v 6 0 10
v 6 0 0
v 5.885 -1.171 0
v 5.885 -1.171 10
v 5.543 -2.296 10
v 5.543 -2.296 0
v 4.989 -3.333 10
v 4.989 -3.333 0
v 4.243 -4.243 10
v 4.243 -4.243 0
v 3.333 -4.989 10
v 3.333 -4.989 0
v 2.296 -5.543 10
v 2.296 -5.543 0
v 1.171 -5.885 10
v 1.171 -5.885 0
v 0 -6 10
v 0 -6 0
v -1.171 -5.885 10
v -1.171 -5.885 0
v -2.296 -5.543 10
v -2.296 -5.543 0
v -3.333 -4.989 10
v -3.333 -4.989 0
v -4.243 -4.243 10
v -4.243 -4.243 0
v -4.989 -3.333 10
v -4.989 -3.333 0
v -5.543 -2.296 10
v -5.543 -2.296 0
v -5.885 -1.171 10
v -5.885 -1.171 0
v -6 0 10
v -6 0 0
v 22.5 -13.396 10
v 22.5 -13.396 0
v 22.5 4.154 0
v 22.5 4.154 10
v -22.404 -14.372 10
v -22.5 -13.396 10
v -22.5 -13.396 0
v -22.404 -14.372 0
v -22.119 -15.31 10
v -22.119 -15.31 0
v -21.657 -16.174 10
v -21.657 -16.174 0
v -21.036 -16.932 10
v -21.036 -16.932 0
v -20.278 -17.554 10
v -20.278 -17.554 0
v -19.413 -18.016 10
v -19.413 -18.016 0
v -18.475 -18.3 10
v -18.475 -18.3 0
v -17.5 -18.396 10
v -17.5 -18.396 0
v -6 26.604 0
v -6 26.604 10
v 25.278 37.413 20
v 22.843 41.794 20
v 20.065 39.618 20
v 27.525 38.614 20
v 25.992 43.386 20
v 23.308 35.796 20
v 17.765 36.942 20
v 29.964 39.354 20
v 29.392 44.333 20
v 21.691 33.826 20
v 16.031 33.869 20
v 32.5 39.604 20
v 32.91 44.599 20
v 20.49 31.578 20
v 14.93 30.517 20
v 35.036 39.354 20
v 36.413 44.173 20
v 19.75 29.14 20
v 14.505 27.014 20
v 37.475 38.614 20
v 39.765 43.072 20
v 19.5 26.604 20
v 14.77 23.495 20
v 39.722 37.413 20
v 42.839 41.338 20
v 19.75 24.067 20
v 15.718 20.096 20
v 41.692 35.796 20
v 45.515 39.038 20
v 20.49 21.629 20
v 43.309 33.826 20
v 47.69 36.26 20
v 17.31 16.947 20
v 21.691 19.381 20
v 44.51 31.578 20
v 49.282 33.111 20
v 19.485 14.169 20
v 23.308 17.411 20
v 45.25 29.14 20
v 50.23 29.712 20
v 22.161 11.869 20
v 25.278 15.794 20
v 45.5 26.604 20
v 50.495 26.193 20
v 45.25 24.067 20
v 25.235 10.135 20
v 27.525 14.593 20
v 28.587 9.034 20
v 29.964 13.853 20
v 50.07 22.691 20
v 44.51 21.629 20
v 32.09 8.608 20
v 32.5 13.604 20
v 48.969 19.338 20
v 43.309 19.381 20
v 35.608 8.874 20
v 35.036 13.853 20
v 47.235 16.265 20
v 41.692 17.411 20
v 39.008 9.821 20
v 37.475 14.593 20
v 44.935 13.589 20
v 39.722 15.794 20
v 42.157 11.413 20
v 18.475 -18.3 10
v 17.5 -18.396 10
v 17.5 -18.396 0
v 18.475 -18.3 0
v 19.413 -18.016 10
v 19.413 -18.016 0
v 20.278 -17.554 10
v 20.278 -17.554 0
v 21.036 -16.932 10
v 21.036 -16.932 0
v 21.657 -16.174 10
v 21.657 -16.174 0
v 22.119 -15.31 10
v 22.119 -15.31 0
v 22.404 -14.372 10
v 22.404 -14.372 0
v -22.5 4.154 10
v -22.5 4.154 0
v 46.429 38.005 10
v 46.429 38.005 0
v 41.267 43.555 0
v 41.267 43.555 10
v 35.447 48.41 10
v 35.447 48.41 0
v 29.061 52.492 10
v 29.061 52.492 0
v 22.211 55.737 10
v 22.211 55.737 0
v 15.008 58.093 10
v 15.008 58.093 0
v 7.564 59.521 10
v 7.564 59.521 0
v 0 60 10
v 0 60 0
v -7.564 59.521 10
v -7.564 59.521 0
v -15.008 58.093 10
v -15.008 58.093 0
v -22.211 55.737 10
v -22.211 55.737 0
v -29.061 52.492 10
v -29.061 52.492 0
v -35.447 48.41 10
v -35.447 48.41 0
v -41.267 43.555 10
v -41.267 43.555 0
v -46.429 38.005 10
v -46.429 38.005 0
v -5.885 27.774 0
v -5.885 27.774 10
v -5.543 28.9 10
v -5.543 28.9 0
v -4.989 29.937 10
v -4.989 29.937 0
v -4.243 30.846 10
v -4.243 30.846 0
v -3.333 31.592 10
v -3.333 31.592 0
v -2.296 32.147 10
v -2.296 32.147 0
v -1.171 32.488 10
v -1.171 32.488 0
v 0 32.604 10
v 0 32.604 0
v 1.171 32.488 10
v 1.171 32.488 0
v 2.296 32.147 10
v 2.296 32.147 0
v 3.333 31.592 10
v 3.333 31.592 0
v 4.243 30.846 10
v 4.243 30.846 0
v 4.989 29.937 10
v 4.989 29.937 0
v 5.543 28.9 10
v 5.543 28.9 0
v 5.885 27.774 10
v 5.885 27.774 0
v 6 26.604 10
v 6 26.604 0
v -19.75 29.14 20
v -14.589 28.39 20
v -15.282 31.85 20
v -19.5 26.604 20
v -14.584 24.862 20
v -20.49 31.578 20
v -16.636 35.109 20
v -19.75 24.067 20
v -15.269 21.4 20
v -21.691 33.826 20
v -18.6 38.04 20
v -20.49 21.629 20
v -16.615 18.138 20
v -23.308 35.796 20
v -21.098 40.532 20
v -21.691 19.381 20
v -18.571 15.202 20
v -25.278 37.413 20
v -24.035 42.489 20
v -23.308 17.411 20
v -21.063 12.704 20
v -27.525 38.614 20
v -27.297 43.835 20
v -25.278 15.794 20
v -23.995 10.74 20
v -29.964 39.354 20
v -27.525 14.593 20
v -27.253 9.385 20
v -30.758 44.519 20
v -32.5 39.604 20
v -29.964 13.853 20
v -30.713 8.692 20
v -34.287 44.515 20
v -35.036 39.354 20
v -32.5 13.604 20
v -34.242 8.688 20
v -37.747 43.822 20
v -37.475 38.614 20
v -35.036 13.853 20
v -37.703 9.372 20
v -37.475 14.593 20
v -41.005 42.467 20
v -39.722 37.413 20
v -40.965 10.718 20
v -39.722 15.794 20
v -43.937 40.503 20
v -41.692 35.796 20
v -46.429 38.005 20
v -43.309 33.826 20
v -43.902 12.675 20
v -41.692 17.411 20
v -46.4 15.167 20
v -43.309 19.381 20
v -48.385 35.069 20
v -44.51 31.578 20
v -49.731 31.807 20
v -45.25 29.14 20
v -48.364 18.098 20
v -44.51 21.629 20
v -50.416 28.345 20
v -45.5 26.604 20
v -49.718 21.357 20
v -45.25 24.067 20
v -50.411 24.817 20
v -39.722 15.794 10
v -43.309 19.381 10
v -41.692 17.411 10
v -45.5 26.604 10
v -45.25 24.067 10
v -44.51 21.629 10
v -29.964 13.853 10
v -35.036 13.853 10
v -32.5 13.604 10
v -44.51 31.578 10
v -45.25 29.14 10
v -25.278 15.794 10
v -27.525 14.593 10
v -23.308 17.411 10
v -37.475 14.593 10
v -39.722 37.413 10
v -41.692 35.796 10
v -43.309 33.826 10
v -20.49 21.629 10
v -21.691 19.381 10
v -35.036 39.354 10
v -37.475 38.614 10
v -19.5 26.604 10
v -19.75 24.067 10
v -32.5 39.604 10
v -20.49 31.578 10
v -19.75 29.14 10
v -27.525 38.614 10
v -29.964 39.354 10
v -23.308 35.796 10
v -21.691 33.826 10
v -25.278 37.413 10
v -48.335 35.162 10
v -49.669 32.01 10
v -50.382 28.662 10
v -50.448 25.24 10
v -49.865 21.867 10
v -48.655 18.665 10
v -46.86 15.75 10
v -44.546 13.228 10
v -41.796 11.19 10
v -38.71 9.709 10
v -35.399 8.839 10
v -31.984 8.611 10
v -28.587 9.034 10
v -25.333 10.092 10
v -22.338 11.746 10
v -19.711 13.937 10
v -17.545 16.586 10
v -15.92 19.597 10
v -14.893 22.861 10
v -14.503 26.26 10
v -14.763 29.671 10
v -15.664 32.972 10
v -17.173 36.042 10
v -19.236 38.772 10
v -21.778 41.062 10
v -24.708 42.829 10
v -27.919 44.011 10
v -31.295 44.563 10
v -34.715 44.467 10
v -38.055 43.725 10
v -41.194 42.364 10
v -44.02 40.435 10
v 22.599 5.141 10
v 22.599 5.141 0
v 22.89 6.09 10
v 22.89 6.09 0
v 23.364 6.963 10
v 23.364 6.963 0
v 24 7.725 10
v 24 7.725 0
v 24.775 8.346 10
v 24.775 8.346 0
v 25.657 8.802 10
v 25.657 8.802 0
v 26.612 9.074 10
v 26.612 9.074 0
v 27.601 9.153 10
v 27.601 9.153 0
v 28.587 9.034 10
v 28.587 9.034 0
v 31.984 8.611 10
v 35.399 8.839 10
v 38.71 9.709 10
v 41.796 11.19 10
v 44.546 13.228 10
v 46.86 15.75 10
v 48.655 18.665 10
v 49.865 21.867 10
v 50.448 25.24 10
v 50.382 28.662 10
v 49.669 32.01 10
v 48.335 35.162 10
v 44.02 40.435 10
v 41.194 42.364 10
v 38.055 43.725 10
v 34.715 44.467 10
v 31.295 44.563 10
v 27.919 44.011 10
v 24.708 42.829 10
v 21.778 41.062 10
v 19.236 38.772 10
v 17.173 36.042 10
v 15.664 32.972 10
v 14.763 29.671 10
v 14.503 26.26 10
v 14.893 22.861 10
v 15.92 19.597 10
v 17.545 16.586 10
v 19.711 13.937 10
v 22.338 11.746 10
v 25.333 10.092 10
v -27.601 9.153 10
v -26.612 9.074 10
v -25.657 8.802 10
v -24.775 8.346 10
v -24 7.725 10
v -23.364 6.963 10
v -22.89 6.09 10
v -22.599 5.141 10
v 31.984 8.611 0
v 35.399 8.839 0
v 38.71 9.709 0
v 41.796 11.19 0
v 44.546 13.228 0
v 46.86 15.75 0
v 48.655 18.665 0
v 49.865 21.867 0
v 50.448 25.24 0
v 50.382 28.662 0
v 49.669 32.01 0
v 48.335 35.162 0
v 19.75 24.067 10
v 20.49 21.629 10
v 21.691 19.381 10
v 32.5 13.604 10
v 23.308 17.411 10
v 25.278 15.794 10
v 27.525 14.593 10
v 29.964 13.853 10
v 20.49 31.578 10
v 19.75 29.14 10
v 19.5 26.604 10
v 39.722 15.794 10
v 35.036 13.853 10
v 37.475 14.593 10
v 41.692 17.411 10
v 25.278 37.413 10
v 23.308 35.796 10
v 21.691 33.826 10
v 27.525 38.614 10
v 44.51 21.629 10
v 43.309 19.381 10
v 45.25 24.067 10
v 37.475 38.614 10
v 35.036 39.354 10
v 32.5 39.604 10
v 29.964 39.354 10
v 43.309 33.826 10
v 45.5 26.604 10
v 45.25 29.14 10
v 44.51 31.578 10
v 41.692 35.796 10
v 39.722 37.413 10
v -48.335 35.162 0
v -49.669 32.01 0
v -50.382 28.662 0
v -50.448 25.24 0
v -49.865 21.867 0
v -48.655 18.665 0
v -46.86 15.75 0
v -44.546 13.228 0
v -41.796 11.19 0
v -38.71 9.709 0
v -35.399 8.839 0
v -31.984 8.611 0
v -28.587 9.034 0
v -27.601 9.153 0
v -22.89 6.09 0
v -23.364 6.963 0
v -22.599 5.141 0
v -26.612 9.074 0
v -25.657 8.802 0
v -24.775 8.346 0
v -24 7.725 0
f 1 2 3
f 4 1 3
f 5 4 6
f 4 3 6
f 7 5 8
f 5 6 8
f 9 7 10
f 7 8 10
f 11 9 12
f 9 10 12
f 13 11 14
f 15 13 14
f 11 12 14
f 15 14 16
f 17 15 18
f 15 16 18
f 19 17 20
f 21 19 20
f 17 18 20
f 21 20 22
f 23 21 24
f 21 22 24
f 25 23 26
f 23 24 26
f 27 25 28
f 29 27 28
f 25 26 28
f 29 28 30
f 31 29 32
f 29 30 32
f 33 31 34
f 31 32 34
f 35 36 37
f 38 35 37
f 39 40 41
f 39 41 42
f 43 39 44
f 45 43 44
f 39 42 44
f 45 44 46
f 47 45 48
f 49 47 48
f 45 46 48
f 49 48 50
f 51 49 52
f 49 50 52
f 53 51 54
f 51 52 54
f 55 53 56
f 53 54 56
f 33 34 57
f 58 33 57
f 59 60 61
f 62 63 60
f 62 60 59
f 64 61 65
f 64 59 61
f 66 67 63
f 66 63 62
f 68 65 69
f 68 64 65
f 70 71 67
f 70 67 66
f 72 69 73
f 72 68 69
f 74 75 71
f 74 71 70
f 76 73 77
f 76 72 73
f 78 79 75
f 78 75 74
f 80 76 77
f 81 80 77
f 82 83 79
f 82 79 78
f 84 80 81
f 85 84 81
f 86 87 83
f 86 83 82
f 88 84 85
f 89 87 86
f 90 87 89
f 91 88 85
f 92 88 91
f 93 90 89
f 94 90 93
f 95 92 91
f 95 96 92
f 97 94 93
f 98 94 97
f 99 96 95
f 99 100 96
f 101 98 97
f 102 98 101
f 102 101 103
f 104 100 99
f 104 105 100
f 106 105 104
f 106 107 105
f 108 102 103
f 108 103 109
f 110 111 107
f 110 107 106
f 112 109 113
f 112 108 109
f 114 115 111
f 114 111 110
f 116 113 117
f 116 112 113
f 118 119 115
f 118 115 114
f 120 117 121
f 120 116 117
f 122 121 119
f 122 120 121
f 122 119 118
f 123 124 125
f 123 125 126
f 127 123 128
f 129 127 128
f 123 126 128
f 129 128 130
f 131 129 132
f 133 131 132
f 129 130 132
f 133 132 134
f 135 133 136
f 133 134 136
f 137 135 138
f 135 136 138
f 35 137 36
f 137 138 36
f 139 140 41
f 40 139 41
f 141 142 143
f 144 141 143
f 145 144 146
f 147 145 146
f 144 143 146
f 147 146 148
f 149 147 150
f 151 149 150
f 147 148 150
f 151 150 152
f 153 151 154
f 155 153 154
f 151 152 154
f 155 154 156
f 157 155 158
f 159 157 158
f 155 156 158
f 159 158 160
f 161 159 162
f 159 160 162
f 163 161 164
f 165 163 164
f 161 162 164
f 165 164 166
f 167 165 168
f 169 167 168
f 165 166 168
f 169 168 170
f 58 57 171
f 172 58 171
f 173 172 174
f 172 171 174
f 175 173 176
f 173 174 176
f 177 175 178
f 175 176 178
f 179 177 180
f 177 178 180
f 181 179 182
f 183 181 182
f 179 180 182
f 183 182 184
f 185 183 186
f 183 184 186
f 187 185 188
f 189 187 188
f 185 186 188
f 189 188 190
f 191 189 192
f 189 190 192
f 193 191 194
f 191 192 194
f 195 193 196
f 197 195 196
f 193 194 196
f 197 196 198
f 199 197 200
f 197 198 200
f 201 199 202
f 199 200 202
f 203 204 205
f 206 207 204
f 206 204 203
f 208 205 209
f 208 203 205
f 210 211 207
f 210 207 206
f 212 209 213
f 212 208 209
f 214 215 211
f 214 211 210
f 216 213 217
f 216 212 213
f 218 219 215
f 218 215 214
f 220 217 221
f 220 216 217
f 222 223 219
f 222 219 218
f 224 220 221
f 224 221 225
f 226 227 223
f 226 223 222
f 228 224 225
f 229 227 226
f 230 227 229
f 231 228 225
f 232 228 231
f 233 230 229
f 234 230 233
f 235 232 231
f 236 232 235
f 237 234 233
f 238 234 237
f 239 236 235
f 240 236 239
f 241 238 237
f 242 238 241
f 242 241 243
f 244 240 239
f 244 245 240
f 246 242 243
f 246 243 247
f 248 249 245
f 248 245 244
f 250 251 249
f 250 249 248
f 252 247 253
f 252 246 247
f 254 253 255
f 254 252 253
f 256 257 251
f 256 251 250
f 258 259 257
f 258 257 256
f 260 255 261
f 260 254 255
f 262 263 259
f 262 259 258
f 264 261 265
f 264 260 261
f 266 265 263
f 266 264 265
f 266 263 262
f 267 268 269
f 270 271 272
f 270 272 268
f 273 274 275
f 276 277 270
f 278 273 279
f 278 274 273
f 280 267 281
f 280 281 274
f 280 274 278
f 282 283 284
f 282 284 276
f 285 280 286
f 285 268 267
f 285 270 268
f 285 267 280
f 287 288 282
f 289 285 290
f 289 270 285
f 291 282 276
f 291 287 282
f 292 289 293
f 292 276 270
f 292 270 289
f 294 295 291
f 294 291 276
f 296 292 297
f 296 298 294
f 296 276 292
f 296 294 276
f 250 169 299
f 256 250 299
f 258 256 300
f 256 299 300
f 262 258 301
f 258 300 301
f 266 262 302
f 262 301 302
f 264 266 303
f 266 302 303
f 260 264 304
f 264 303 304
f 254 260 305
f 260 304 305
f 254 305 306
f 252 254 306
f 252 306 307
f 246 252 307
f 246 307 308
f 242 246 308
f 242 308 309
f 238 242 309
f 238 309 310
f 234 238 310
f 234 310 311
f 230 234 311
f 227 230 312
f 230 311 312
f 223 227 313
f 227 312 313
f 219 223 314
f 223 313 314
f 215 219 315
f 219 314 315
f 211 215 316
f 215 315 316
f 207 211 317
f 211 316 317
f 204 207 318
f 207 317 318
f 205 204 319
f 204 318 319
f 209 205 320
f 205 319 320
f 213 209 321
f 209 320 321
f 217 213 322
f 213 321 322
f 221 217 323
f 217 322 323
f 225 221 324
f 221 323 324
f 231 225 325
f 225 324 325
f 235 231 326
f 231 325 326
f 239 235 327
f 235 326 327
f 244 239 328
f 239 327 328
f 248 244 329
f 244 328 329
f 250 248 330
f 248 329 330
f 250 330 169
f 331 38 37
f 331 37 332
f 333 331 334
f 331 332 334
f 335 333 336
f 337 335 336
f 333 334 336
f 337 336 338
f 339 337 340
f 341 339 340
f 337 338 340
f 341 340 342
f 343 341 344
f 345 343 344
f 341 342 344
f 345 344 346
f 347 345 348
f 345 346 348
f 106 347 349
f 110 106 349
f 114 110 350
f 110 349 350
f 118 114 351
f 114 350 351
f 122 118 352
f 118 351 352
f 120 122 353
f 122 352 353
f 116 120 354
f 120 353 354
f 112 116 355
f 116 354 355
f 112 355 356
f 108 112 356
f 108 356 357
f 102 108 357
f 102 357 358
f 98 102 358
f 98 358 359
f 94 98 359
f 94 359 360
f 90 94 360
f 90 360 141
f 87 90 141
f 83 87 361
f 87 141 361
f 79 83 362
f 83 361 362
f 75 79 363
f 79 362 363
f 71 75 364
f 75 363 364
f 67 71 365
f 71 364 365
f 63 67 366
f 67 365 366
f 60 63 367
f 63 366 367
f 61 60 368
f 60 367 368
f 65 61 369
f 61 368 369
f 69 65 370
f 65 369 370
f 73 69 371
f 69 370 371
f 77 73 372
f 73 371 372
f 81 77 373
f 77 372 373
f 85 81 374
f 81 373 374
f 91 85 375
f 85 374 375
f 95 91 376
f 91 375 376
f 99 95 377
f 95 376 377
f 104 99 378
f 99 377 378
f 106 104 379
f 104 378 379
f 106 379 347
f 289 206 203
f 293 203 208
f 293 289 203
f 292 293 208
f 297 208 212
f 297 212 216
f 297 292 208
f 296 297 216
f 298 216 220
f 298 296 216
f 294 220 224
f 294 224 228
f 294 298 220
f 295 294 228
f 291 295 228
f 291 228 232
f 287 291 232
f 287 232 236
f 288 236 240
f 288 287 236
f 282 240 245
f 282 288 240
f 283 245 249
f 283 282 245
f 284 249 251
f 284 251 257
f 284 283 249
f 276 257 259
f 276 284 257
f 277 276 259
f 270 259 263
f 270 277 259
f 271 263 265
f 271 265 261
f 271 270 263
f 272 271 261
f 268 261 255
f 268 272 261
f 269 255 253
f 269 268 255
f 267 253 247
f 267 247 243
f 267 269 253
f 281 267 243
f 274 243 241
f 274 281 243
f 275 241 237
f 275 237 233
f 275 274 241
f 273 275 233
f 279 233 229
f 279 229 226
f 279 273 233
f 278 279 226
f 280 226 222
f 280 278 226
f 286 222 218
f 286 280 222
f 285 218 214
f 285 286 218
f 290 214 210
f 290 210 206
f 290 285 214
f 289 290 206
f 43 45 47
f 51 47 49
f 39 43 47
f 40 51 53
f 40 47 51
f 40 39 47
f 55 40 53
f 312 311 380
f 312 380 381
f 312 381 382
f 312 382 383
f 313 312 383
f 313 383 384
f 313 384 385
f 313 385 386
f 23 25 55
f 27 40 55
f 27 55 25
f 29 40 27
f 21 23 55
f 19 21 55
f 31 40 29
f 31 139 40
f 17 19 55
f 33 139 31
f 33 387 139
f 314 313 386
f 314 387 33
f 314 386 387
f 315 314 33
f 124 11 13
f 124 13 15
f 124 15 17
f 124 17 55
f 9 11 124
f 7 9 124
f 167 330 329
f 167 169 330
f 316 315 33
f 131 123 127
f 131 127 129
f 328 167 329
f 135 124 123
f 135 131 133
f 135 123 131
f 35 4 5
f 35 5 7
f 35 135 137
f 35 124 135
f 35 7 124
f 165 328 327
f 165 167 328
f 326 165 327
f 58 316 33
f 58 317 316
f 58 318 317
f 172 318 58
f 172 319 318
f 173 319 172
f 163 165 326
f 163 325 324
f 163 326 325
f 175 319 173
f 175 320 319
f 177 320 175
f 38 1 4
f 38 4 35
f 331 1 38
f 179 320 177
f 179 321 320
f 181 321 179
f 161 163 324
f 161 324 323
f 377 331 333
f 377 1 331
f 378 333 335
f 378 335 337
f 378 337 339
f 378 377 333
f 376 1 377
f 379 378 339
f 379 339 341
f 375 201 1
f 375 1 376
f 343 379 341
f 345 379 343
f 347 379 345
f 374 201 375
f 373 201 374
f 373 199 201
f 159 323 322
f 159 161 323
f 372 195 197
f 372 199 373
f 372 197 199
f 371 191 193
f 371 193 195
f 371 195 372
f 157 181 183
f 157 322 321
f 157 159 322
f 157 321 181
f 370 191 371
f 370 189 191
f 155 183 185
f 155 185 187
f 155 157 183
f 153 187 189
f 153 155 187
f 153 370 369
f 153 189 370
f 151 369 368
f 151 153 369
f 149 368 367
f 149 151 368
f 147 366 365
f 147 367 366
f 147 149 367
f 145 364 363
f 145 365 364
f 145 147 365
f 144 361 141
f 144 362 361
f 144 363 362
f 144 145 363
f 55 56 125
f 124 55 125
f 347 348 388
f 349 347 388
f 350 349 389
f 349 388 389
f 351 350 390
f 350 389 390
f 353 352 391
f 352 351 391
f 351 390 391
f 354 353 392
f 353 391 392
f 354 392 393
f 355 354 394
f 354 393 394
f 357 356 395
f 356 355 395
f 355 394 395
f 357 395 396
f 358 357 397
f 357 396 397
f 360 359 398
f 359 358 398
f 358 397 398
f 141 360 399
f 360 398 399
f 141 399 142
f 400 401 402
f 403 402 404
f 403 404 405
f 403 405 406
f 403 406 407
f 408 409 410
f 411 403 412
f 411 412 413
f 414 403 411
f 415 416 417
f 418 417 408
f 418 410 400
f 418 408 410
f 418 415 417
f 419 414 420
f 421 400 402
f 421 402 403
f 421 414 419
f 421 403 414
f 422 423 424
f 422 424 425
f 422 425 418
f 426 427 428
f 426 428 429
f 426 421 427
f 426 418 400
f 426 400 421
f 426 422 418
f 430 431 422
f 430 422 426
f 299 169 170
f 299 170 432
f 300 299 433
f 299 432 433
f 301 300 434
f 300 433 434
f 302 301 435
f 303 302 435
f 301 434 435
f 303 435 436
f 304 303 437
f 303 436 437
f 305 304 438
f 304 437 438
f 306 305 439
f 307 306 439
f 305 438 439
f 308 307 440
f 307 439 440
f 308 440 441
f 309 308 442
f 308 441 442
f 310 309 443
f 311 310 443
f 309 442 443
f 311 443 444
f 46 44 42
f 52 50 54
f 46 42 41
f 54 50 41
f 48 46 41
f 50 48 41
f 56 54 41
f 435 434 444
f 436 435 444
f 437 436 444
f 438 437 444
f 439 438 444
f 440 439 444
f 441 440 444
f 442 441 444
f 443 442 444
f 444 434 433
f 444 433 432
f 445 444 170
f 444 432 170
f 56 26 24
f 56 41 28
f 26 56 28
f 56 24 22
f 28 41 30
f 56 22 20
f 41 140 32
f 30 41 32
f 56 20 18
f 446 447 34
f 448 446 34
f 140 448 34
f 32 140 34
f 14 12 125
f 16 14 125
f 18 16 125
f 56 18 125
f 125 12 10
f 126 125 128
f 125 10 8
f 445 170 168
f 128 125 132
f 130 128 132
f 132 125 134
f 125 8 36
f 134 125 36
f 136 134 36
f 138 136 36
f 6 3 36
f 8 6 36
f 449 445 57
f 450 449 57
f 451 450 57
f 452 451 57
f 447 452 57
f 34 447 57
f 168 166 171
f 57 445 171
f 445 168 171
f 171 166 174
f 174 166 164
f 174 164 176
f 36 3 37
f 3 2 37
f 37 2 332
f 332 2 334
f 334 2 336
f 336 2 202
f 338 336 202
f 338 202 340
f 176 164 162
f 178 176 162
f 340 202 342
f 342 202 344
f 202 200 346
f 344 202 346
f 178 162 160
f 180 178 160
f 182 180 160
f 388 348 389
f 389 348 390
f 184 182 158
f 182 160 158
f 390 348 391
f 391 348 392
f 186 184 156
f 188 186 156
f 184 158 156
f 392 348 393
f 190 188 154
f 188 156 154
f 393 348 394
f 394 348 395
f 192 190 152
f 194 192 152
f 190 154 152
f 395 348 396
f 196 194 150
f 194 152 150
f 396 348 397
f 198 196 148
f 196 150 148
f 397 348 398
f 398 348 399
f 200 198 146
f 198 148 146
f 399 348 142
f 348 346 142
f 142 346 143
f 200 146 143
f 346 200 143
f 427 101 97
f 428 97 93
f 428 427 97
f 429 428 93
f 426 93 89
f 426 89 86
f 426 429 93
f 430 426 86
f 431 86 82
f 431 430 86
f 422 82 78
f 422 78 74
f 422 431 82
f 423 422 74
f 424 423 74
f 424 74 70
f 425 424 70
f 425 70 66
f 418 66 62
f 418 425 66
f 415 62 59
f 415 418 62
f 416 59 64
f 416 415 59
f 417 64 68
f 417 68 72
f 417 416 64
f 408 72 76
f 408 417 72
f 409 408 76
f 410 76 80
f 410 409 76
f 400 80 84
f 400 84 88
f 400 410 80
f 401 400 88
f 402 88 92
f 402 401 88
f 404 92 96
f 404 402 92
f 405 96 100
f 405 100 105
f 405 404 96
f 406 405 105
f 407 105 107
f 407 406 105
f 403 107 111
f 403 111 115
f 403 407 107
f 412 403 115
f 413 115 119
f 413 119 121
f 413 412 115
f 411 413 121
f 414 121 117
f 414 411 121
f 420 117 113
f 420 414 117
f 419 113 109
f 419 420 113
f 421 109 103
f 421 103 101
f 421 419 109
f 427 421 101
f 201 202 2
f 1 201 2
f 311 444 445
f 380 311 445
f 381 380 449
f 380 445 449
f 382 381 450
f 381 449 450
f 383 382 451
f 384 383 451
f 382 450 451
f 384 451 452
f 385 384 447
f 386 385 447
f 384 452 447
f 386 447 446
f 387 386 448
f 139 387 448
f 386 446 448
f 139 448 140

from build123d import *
from build123d.topology import SkipClean

# Parameters (mm, degrees)
SKETCH1_R           = 18
SKETCH1_R_2         = 13
BOSS_EXTRUDE1_DEPTH = 10
BOSS_EXTRUDE2_START = 10
SKETCH1_3_R         = 18
SKETCH1_3_R_2       = 13
BOSS_EXTRUDE2_DEPTH = 10


with BuildPart() as part:
    # Sketch1 → Boss-Extrude1 (new body)
    # profile 1 of 5: a face of its own
    with BuildSketch(Plane.XY):
        with BuildLine():
            Line((-17.5, -18.396428811), (17.5, -18.396428811))
            ThreePointArc((17.5, -18.396428811), (21.035533906, -16.931962717), (22.5, -13.396428811))
            Line((22.5, -13.396428811), (22.5, 4.153626868))
            ThreePointArc((22.5, 4.153626868), (24.372283789, 8.054574356), (28.586956522, 9.034049547))
            ThreePointArc((28.586956522, 9.034049547), (17.17328588, 36.042418273), (46.428571429, 38.005101698))
            ThreePointArc((46.428571429, 38.005101698), (0, 60), (-46.428571429, 38.005101698))
            ThreePointArc((-46.428571429, 38.005101698), (-26.446665618, 43.555182996), (-14.5, 26.603571189))
            ThreePointArc((-14.5, 26.603571189), (-18.456589043, 15.34379283), (-28.586956522, 9.034049547))
            ThreePointArc((-28.586956522, 9.034049547), (-24.372283789, 8.054574356), (-22.5, 4.153626868))
            Line((-22.5, 4.153626868), (-22.5, -13.396428811))
            ThreePointArc((-22.5, -13.396428811), (-21.035533906, -16.931962717), (-17.5, -18.396428811))
        make_face()
        with BuildLine():
            ThreePointArc((6, 0), (0, -6), (-6, 0))
            Line((-6, 0), (-6, 26.603571189))
            ThreePointArc((-6, 26.603571189), (0, 32.603571189), (6, 26.603571189))
            Line((6, 26.603571189), (6, 0))
        make_face(mode=Mode.SUBTRACT)
    # profile 2 of 5: a face of its own
    with BuildSketch(Plane.XY):
        with Locations((-32.5, 26.603571189)):
            Circle(SKETCH1_R)
        with Locations((-32.5, 26.603571189)):
            Circle(SKETCH1_R_2, mode=Mode.SUBTRACT)
    # profile 3 of 5: a face of its own
    with BuildSketch(Plane.XY):
        with Locations((-32.5, 26.603571189)):
            Circle(SKETCH1_R_2)
    # profile 4 of 5: a face of its own
    with BuildSketch(Plane.XY):
        with Locations((32.5, 26.603571189)):
            Circle(SKETCH1_R)
        with Locations((32.5, 26.603571189)):
            Circle(SKETCH1_R_2, mode=Mode.SUBTRACT)
    # profile 5 of 5: a face of its own
    with BuildSketch(Plane.XY):
        with Locations((32.5, 26.603571189)):
            Circle(SKETCH1_R_2)
    extrude(amount=BOSS_EXTRUDE1_DEPTH)

    # Sketch1<3> → Boss-Extrude2 (add)
    # profile 1 of 2: a face of its own
    with SkipClean():  # the faces are left unmerged after this step: merging them gives an invalid solid
        with BuildSketch(Plane.XY.offset(BOSS_EXTRUDE2_START)):
            with Locations(Location((-32.5, 26.603571189, 0), (0, 0, 140.697224227))):
                Circle(SKETCH1_3_R)
            with Locations((-32.5, 26.603571189)):
                Circle(SKETCH1_3_R_2, mode=Mode.SUBTRACT)
        # profile 2 of 2: a face of its own
        with BuildSketch(Plane.XY.offset(BOSS_EXTRUDE2_START)):
            with Locations(Location((32.5, 26.603571189, 0), (0, 0, 257.444142201))):
                Circle(SKETCH1_3_R)
            with Locations((32.5, 26.603571189)):
                Circle(SKETCH1_3_R_2, mode=Mode.SUBTRACT)
        extrude(amount=BOSS_EXTRUDE2_DEPTH)


solid = part.part
